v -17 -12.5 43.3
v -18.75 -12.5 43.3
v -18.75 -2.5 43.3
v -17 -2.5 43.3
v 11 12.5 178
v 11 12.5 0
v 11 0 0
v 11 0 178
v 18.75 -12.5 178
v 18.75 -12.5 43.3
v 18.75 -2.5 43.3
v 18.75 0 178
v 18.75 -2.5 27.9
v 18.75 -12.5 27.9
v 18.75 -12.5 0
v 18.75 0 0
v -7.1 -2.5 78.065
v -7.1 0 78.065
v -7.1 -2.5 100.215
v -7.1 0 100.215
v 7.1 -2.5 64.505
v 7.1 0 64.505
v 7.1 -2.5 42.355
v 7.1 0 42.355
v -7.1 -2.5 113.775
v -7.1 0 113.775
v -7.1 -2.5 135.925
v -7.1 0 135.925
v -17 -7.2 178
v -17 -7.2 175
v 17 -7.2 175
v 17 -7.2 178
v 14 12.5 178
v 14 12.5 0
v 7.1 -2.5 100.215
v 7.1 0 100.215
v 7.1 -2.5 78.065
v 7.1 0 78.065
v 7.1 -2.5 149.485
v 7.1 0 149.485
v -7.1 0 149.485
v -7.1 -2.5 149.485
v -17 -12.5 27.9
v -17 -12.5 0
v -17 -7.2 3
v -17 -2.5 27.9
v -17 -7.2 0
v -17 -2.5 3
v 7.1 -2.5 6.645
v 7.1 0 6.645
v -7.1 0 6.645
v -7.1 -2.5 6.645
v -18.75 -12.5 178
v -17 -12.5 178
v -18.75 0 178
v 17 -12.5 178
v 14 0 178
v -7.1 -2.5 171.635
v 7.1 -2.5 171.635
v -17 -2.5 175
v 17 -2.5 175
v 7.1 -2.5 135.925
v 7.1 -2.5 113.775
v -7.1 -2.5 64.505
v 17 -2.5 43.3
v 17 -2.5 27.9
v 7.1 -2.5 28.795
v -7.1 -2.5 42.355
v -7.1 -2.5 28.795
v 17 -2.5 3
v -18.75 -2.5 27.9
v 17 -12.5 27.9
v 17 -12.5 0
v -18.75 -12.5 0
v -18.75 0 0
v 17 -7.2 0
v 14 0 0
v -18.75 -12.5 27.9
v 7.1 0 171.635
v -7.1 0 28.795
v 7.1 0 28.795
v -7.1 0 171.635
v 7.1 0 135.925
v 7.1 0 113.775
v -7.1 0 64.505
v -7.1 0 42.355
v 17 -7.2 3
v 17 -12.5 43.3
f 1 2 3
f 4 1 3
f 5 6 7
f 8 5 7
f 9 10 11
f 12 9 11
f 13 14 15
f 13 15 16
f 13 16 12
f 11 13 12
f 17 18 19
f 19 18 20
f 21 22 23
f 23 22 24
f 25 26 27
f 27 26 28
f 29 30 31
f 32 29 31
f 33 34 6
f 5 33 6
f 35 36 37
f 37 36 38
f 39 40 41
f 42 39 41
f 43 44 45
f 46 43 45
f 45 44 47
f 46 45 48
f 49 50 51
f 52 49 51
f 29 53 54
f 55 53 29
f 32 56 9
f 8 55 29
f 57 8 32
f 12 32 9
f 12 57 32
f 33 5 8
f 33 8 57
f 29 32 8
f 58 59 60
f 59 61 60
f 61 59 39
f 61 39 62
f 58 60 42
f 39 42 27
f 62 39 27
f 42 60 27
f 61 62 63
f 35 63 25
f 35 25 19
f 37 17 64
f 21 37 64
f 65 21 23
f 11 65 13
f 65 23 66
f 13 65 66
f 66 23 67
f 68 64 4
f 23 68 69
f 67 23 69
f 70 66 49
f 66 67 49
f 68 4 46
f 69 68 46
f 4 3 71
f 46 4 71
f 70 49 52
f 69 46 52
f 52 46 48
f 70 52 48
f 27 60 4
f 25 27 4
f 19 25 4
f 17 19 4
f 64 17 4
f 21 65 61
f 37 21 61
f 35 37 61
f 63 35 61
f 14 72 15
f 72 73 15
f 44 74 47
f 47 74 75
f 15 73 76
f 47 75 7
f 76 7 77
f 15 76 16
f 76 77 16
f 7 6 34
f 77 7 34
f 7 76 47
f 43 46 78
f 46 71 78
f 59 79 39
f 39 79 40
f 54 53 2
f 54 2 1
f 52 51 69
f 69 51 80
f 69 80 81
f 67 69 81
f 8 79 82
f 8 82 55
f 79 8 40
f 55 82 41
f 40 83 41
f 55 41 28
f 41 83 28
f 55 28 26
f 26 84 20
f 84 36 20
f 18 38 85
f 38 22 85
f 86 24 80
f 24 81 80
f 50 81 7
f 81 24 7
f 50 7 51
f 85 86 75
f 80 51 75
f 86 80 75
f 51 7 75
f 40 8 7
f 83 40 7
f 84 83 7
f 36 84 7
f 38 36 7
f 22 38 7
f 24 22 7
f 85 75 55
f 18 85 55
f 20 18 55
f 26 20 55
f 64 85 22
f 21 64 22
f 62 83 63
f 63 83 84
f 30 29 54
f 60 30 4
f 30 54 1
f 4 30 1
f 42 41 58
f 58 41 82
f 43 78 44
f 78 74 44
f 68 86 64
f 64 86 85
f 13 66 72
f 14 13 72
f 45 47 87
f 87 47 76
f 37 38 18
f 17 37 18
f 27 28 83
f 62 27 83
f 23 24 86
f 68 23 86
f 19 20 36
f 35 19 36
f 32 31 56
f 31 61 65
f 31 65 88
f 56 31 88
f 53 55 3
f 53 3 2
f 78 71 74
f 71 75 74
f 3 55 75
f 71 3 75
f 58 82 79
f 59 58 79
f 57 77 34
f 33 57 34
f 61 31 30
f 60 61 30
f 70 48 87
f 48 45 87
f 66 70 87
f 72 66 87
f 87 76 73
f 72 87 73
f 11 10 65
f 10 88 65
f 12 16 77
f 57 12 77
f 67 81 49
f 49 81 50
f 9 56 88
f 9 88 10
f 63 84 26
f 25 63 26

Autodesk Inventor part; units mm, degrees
sketch "Sketch_1" plane through (0, 0, 0) normal (0, 0, 1) x (1, 0, 0)
  line L0 (-18.75, -12.5) -> (-17, -12.5)
  line L1 (-17, -12.5) -> (-17, -7.2)
  line L2 (-17, -7.2) -> (17, -7.2)
  line L3 (17, -7.2) -> (17, -12.5)
  line L4 (17, -12.5) -> (18.75, -12.5)
  line L5 (18.75, -12.5) -> (18.75, 0)
  line L6 (18.75, 0) -> (14, 0)
  line L7 (14, 0) -> (14, 12.5)
  line L8 (14, 12.5) -> (11, 12.5)
  line L9 (11, 12.5) -> (11, 0)
  line L10 (11, 0) -> (-18.75, 0)
  line L11 (-18.75, 0) -> (-18.75, -12.5)
extrude "Extrusion1" add sketch "Sketch_1" along normal blind 178
sketch "Sketch_2" plane through (-18.75, 0, 0) normal (0, 1, 0) x (0, 0, 1)
  line L0 (6.645, 11.65) -> (28.795, 11.65)
  line L1 (28.795, 11.65) -> (28.795, 25.85)
  line L2 (28.795, 25.85) -> (6.645, 25.85)
  line L3 (6.645, 25.85) -> (6.645, 11.65)
extrude "Extrusion2" cut sketch "Sketch_2" against normal blind 8
sketch "Sketch_3" plane through (-18.75, 0, 0) normal (0, 1, 0) x (0, 0, 1)
  line L0 (42.355, 25.85) -> (42.355, 11.65)
  line L1 (42.355, 11.65) -> (64.505, 11.65)
  line L2 (64.505, 11.65) -> (64.505, 25.85)
  line L3 (64.505, 25.85) -> (42.355, 25.85)
extrude "Extrusion3" cut sketch "Sketch_3" against normal blind 8
sketch "Sketch_4" plane through (-18.75, 0, 0) normal (0, 1, 0) x (0, 0, 1)
  line L0 (78.065, 11.65) -> (100.215, 11.65)
  line L1 (100.215, 11.65) -> (100.215, 25.85)
  line L2 (100.215, 25.85) -> (78.065, 25.85)
  line L3 (78.065, 25.85) -> (78.065, 11.65)
extrude "Extrusion4" cut sketch "Sketch_4" against normal blind 8
sketch "Sketch_5" plane through (-18.75, 0, 0) normal (0, 1, 0) x (0, 0, 1)
  line L0 (113.775, 25.85) -> (113.775, 11.65)
  line L1 (113.775, 11.65) -> (135.925, 11.65)
  line L2 (135.925, 11.65) -> (135.925, 25.85)
  line L3 (135.925, 25.85) -> (113.775, 25.85)
extrude "Extrusion5" cut sketch "Sketch_5" against normal blind 8
sketch "Sketch_6" plane through (-18.75, 0, 0) normal (0, 1, 0) x (0, 0, 1)
  line L0 (149.485, 25.85) -> (149.485, 11.65)
  line L1 (149.485, 11.65) -> (171.635, 11.65)
  line L2 (171.635, 11.65) -> (171.635, 25.85)
  line L3 (171.635, 25.85) -> (149.485, 25.85)
extrude "Extrusion6" cut sketch "Sketch_6" against normal blind 8
sketch "Sketch_10" plane through (-18.75, -12.5, 0) normal (-1, 0, 0) x (0, 0, 1)
  line L0 (27.9, 10) -> (27.9, 0)
  line L1 (27.9, 0) -> (43.3, 0)
  line L2 (43.3, 0) -> (43.3, 10)
  line L3 (43.3, 10) -> (27.9, 10)
extrude "Extrusion7" cut sketch "Sketch_10" against normal blind 37.5
sketch "Sketch_13" plane through (-17, -7.2, 0) normal (0, -1, 0) x (1, 0, 0)
  line L0 (0, 175) -> (0, 3)
  line L1 (0, 3) -> (34, 3)
  line L2 (34, 3) -> (34, 175)
  line L3 (34, 175) -> (0, 175)
extrude "Extrusion8" cut sketch "Sketch_13" against normal blind 4.7
ref_plane "p_XY" through (0, 0, 0) normal (0, 1, 0) x (1, 0, 0)
ref_plane "p_YZ" through (0, 0, 0) normal (1, 0, 0) x (0, 0, -1)
ref_plane "p_ZX" through (0, 0, 0) normal (0, 0, -1) x (0, 1, 0)
ref_plane "p1_XY" through (0, -9.5, 17.72) normal (1, 0, 0) x (0, 0, -1)
ref_plane "p1_YZ" through (0, -9.5, 17.72) normal (0, 0, -1) x (0, 1, 0)
ref_plane "p1_ZX" through (0, -9.5, 17.72) normal (0, 1, 0) x (1, 0, 0)
ref_plane "p2_XY" through (0, -9.5, 53.43) normal (1, 0, 0) x (0, 0, -1)
ref_plane "p2_YZ" through (0, -9.5, 53.43) normal (0, 0, -1) x (0, 1, 0)
ref_plane "p2_ZX" through (0, -9.5, 53.43) normal (0, 1, 0) x (1, 0, 0)
ref_plane "p3_XY" through (0, -9.5, 89.14) normal (1, 0, 0) x (0, 0, -1)
ref_plane "p3_YZ" through (0, -9.5, 89.14) normal (0, 0, -1) x (0, 1, 0)
ref_plane "p3_ZX" through (0, -9.5, 89.14) normal (0, 1, 0) x (1, 0, 0)
ref_plane "p4_XY" through (0, -9.5, 124.85) normal (1, 0, 0) x (0, 0, -1)
ref_plane "p4_YZ" through (0, -9.5, 124.85) normal (0, 0, -1) x (0, 1, 0)
ref_plane "p4_ZX" through (0, -9.5, 124.85) normal (0, 1, 0) x (1, 0, 0)
ref_plane "p5_XY" through (0, -9.5, 160.56) normal (1, 0, 0) x (0, 0, -1)
ref_plane "p5_YZ" through (0, -9.5, 160.56) normal (0, 0, -1) x (0, 1, 0)
ref_plane "p5_ZX" through (0, -9.5, 160.56) normal (0, 1, 0) x (1, 0, 0)
ref_plane "p6_XY" through (0, -9.5, 196.27) normal (1, 0, 0) x (0, 0, -1)
ref_plane "p6_YZ" through (0, -9.5, 196.27) normal (0, 0, -1) x (0, 1, 0)
ref_plane "p6_ZX" through (0, -9.5, 196.27) normal (0, 1, 0) x (1, 0, 0)
ref_plane "p7_XY" through (0, -9.5, 231.98) normal (1, 0, 0) x (0, 0, -1)
ref_plane "p7_YZ" through (0, -9.5, 231.98) normal (0, 0, -1) x (0, 1, 0)
ref_plane "p7_ZX" through (0, -9.5, 231.98) normal (0, 1, 0) x (1, 0, 0)
properties part number "PRO10282 Rollenleiste Abdeckung mit Seitenfuehrung 178"
